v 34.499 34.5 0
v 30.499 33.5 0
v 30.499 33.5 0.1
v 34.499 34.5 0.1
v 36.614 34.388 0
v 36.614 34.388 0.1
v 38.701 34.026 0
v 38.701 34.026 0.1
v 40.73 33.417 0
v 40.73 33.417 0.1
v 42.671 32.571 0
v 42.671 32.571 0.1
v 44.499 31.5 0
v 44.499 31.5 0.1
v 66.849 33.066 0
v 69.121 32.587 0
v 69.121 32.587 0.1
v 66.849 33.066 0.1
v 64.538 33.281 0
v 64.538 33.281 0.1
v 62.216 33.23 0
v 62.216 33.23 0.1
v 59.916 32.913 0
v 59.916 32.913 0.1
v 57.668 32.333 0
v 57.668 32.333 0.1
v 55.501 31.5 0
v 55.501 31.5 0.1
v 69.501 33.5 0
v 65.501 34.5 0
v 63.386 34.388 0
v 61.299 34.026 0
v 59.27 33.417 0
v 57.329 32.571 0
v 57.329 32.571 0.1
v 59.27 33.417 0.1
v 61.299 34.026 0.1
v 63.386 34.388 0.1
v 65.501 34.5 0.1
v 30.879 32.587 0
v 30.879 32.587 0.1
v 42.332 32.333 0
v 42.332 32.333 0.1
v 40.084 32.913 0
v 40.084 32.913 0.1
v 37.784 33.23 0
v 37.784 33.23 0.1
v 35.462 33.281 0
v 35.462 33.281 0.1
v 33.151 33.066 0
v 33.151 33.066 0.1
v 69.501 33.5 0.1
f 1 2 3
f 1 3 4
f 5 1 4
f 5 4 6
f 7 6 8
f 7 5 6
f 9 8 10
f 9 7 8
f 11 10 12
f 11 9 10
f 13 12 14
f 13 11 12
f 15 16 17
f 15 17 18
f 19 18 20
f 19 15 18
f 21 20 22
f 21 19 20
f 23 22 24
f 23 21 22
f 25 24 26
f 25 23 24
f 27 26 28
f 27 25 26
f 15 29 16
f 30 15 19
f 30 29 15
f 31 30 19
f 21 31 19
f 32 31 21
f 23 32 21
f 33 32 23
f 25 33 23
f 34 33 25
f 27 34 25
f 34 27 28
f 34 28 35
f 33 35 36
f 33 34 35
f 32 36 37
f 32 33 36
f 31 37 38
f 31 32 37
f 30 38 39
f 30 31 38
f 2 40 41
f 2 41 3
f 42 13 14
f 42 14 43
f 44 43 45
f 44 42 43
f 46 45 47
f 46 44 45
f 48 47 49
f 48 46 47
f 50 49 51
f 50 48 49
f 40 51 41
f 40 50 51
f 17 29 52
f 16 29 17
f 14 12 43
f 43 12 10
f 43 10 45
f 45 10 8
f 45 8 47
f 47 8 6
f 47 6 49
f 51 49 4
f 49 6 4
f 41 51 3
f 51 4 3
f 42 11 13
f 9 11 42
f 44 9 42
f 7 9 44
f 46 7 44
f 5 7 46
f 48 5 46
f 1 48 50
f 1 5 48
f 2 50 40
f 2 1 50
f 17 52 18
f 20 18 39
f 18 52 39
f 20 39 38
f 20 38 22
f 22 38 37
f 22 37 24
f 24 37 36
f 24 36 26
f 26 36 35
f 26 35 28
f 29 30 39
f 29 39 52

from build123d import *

# Parameters (mm, degrees)
SALIENTE_EXTRUIR1_DEPTH   = 0.1
SALIENTE_EXTRUIR1_2_DEPTH = 0.1


with BuildPart() as part:
    # Model → Saliente-Extruir1 (new body)
    with BuildSketch(Plane.XY):
        with BuildLine():
            Line((30.879125436, 32.586549458), (30.498742543, 33.499779932))
            Line((30.498742543, 33.499779932), (34.498742543, 34.499779932))
            ThreePointArc((34.498742543, 34.499779932), (39.724293984, 33.751618068), (44.498742543, 31.499779932))
            ThreePointArc((44.498742543, 31.499779932), (37.783634438, 33.229970005), (30.879125436, 32.586549458))
        make_face()
    extrude(amount=SALIENTE_EXTRUIR1_DEPTH)


with BuildPart() as body_2:
    # Model → Saliente-Extruir1 2 (new body)
    with BuildSketch(Plane.XY):
        with BuildLine():
            Line((65.501257457, 34.499779932), (69.501257457, 33.499779932))
            Line((69.501257457, 33.499779932), (69.120874564, 32.586549458))
            ThreePointArc((69.120874564, 32.586549458), (62.216365562, 33.229970005), (55.501257457, 31.499779932))
            ThreePointArc((55.501257457, 31.499779932), (60.275706016, 33.751618068), (65.501257457, 34.499779932))
        make_face()
    extrude(amount=SALIENTE_EXTRUIR1_2_DEPTH)


solid = Compound([part.part, body_2.part])
